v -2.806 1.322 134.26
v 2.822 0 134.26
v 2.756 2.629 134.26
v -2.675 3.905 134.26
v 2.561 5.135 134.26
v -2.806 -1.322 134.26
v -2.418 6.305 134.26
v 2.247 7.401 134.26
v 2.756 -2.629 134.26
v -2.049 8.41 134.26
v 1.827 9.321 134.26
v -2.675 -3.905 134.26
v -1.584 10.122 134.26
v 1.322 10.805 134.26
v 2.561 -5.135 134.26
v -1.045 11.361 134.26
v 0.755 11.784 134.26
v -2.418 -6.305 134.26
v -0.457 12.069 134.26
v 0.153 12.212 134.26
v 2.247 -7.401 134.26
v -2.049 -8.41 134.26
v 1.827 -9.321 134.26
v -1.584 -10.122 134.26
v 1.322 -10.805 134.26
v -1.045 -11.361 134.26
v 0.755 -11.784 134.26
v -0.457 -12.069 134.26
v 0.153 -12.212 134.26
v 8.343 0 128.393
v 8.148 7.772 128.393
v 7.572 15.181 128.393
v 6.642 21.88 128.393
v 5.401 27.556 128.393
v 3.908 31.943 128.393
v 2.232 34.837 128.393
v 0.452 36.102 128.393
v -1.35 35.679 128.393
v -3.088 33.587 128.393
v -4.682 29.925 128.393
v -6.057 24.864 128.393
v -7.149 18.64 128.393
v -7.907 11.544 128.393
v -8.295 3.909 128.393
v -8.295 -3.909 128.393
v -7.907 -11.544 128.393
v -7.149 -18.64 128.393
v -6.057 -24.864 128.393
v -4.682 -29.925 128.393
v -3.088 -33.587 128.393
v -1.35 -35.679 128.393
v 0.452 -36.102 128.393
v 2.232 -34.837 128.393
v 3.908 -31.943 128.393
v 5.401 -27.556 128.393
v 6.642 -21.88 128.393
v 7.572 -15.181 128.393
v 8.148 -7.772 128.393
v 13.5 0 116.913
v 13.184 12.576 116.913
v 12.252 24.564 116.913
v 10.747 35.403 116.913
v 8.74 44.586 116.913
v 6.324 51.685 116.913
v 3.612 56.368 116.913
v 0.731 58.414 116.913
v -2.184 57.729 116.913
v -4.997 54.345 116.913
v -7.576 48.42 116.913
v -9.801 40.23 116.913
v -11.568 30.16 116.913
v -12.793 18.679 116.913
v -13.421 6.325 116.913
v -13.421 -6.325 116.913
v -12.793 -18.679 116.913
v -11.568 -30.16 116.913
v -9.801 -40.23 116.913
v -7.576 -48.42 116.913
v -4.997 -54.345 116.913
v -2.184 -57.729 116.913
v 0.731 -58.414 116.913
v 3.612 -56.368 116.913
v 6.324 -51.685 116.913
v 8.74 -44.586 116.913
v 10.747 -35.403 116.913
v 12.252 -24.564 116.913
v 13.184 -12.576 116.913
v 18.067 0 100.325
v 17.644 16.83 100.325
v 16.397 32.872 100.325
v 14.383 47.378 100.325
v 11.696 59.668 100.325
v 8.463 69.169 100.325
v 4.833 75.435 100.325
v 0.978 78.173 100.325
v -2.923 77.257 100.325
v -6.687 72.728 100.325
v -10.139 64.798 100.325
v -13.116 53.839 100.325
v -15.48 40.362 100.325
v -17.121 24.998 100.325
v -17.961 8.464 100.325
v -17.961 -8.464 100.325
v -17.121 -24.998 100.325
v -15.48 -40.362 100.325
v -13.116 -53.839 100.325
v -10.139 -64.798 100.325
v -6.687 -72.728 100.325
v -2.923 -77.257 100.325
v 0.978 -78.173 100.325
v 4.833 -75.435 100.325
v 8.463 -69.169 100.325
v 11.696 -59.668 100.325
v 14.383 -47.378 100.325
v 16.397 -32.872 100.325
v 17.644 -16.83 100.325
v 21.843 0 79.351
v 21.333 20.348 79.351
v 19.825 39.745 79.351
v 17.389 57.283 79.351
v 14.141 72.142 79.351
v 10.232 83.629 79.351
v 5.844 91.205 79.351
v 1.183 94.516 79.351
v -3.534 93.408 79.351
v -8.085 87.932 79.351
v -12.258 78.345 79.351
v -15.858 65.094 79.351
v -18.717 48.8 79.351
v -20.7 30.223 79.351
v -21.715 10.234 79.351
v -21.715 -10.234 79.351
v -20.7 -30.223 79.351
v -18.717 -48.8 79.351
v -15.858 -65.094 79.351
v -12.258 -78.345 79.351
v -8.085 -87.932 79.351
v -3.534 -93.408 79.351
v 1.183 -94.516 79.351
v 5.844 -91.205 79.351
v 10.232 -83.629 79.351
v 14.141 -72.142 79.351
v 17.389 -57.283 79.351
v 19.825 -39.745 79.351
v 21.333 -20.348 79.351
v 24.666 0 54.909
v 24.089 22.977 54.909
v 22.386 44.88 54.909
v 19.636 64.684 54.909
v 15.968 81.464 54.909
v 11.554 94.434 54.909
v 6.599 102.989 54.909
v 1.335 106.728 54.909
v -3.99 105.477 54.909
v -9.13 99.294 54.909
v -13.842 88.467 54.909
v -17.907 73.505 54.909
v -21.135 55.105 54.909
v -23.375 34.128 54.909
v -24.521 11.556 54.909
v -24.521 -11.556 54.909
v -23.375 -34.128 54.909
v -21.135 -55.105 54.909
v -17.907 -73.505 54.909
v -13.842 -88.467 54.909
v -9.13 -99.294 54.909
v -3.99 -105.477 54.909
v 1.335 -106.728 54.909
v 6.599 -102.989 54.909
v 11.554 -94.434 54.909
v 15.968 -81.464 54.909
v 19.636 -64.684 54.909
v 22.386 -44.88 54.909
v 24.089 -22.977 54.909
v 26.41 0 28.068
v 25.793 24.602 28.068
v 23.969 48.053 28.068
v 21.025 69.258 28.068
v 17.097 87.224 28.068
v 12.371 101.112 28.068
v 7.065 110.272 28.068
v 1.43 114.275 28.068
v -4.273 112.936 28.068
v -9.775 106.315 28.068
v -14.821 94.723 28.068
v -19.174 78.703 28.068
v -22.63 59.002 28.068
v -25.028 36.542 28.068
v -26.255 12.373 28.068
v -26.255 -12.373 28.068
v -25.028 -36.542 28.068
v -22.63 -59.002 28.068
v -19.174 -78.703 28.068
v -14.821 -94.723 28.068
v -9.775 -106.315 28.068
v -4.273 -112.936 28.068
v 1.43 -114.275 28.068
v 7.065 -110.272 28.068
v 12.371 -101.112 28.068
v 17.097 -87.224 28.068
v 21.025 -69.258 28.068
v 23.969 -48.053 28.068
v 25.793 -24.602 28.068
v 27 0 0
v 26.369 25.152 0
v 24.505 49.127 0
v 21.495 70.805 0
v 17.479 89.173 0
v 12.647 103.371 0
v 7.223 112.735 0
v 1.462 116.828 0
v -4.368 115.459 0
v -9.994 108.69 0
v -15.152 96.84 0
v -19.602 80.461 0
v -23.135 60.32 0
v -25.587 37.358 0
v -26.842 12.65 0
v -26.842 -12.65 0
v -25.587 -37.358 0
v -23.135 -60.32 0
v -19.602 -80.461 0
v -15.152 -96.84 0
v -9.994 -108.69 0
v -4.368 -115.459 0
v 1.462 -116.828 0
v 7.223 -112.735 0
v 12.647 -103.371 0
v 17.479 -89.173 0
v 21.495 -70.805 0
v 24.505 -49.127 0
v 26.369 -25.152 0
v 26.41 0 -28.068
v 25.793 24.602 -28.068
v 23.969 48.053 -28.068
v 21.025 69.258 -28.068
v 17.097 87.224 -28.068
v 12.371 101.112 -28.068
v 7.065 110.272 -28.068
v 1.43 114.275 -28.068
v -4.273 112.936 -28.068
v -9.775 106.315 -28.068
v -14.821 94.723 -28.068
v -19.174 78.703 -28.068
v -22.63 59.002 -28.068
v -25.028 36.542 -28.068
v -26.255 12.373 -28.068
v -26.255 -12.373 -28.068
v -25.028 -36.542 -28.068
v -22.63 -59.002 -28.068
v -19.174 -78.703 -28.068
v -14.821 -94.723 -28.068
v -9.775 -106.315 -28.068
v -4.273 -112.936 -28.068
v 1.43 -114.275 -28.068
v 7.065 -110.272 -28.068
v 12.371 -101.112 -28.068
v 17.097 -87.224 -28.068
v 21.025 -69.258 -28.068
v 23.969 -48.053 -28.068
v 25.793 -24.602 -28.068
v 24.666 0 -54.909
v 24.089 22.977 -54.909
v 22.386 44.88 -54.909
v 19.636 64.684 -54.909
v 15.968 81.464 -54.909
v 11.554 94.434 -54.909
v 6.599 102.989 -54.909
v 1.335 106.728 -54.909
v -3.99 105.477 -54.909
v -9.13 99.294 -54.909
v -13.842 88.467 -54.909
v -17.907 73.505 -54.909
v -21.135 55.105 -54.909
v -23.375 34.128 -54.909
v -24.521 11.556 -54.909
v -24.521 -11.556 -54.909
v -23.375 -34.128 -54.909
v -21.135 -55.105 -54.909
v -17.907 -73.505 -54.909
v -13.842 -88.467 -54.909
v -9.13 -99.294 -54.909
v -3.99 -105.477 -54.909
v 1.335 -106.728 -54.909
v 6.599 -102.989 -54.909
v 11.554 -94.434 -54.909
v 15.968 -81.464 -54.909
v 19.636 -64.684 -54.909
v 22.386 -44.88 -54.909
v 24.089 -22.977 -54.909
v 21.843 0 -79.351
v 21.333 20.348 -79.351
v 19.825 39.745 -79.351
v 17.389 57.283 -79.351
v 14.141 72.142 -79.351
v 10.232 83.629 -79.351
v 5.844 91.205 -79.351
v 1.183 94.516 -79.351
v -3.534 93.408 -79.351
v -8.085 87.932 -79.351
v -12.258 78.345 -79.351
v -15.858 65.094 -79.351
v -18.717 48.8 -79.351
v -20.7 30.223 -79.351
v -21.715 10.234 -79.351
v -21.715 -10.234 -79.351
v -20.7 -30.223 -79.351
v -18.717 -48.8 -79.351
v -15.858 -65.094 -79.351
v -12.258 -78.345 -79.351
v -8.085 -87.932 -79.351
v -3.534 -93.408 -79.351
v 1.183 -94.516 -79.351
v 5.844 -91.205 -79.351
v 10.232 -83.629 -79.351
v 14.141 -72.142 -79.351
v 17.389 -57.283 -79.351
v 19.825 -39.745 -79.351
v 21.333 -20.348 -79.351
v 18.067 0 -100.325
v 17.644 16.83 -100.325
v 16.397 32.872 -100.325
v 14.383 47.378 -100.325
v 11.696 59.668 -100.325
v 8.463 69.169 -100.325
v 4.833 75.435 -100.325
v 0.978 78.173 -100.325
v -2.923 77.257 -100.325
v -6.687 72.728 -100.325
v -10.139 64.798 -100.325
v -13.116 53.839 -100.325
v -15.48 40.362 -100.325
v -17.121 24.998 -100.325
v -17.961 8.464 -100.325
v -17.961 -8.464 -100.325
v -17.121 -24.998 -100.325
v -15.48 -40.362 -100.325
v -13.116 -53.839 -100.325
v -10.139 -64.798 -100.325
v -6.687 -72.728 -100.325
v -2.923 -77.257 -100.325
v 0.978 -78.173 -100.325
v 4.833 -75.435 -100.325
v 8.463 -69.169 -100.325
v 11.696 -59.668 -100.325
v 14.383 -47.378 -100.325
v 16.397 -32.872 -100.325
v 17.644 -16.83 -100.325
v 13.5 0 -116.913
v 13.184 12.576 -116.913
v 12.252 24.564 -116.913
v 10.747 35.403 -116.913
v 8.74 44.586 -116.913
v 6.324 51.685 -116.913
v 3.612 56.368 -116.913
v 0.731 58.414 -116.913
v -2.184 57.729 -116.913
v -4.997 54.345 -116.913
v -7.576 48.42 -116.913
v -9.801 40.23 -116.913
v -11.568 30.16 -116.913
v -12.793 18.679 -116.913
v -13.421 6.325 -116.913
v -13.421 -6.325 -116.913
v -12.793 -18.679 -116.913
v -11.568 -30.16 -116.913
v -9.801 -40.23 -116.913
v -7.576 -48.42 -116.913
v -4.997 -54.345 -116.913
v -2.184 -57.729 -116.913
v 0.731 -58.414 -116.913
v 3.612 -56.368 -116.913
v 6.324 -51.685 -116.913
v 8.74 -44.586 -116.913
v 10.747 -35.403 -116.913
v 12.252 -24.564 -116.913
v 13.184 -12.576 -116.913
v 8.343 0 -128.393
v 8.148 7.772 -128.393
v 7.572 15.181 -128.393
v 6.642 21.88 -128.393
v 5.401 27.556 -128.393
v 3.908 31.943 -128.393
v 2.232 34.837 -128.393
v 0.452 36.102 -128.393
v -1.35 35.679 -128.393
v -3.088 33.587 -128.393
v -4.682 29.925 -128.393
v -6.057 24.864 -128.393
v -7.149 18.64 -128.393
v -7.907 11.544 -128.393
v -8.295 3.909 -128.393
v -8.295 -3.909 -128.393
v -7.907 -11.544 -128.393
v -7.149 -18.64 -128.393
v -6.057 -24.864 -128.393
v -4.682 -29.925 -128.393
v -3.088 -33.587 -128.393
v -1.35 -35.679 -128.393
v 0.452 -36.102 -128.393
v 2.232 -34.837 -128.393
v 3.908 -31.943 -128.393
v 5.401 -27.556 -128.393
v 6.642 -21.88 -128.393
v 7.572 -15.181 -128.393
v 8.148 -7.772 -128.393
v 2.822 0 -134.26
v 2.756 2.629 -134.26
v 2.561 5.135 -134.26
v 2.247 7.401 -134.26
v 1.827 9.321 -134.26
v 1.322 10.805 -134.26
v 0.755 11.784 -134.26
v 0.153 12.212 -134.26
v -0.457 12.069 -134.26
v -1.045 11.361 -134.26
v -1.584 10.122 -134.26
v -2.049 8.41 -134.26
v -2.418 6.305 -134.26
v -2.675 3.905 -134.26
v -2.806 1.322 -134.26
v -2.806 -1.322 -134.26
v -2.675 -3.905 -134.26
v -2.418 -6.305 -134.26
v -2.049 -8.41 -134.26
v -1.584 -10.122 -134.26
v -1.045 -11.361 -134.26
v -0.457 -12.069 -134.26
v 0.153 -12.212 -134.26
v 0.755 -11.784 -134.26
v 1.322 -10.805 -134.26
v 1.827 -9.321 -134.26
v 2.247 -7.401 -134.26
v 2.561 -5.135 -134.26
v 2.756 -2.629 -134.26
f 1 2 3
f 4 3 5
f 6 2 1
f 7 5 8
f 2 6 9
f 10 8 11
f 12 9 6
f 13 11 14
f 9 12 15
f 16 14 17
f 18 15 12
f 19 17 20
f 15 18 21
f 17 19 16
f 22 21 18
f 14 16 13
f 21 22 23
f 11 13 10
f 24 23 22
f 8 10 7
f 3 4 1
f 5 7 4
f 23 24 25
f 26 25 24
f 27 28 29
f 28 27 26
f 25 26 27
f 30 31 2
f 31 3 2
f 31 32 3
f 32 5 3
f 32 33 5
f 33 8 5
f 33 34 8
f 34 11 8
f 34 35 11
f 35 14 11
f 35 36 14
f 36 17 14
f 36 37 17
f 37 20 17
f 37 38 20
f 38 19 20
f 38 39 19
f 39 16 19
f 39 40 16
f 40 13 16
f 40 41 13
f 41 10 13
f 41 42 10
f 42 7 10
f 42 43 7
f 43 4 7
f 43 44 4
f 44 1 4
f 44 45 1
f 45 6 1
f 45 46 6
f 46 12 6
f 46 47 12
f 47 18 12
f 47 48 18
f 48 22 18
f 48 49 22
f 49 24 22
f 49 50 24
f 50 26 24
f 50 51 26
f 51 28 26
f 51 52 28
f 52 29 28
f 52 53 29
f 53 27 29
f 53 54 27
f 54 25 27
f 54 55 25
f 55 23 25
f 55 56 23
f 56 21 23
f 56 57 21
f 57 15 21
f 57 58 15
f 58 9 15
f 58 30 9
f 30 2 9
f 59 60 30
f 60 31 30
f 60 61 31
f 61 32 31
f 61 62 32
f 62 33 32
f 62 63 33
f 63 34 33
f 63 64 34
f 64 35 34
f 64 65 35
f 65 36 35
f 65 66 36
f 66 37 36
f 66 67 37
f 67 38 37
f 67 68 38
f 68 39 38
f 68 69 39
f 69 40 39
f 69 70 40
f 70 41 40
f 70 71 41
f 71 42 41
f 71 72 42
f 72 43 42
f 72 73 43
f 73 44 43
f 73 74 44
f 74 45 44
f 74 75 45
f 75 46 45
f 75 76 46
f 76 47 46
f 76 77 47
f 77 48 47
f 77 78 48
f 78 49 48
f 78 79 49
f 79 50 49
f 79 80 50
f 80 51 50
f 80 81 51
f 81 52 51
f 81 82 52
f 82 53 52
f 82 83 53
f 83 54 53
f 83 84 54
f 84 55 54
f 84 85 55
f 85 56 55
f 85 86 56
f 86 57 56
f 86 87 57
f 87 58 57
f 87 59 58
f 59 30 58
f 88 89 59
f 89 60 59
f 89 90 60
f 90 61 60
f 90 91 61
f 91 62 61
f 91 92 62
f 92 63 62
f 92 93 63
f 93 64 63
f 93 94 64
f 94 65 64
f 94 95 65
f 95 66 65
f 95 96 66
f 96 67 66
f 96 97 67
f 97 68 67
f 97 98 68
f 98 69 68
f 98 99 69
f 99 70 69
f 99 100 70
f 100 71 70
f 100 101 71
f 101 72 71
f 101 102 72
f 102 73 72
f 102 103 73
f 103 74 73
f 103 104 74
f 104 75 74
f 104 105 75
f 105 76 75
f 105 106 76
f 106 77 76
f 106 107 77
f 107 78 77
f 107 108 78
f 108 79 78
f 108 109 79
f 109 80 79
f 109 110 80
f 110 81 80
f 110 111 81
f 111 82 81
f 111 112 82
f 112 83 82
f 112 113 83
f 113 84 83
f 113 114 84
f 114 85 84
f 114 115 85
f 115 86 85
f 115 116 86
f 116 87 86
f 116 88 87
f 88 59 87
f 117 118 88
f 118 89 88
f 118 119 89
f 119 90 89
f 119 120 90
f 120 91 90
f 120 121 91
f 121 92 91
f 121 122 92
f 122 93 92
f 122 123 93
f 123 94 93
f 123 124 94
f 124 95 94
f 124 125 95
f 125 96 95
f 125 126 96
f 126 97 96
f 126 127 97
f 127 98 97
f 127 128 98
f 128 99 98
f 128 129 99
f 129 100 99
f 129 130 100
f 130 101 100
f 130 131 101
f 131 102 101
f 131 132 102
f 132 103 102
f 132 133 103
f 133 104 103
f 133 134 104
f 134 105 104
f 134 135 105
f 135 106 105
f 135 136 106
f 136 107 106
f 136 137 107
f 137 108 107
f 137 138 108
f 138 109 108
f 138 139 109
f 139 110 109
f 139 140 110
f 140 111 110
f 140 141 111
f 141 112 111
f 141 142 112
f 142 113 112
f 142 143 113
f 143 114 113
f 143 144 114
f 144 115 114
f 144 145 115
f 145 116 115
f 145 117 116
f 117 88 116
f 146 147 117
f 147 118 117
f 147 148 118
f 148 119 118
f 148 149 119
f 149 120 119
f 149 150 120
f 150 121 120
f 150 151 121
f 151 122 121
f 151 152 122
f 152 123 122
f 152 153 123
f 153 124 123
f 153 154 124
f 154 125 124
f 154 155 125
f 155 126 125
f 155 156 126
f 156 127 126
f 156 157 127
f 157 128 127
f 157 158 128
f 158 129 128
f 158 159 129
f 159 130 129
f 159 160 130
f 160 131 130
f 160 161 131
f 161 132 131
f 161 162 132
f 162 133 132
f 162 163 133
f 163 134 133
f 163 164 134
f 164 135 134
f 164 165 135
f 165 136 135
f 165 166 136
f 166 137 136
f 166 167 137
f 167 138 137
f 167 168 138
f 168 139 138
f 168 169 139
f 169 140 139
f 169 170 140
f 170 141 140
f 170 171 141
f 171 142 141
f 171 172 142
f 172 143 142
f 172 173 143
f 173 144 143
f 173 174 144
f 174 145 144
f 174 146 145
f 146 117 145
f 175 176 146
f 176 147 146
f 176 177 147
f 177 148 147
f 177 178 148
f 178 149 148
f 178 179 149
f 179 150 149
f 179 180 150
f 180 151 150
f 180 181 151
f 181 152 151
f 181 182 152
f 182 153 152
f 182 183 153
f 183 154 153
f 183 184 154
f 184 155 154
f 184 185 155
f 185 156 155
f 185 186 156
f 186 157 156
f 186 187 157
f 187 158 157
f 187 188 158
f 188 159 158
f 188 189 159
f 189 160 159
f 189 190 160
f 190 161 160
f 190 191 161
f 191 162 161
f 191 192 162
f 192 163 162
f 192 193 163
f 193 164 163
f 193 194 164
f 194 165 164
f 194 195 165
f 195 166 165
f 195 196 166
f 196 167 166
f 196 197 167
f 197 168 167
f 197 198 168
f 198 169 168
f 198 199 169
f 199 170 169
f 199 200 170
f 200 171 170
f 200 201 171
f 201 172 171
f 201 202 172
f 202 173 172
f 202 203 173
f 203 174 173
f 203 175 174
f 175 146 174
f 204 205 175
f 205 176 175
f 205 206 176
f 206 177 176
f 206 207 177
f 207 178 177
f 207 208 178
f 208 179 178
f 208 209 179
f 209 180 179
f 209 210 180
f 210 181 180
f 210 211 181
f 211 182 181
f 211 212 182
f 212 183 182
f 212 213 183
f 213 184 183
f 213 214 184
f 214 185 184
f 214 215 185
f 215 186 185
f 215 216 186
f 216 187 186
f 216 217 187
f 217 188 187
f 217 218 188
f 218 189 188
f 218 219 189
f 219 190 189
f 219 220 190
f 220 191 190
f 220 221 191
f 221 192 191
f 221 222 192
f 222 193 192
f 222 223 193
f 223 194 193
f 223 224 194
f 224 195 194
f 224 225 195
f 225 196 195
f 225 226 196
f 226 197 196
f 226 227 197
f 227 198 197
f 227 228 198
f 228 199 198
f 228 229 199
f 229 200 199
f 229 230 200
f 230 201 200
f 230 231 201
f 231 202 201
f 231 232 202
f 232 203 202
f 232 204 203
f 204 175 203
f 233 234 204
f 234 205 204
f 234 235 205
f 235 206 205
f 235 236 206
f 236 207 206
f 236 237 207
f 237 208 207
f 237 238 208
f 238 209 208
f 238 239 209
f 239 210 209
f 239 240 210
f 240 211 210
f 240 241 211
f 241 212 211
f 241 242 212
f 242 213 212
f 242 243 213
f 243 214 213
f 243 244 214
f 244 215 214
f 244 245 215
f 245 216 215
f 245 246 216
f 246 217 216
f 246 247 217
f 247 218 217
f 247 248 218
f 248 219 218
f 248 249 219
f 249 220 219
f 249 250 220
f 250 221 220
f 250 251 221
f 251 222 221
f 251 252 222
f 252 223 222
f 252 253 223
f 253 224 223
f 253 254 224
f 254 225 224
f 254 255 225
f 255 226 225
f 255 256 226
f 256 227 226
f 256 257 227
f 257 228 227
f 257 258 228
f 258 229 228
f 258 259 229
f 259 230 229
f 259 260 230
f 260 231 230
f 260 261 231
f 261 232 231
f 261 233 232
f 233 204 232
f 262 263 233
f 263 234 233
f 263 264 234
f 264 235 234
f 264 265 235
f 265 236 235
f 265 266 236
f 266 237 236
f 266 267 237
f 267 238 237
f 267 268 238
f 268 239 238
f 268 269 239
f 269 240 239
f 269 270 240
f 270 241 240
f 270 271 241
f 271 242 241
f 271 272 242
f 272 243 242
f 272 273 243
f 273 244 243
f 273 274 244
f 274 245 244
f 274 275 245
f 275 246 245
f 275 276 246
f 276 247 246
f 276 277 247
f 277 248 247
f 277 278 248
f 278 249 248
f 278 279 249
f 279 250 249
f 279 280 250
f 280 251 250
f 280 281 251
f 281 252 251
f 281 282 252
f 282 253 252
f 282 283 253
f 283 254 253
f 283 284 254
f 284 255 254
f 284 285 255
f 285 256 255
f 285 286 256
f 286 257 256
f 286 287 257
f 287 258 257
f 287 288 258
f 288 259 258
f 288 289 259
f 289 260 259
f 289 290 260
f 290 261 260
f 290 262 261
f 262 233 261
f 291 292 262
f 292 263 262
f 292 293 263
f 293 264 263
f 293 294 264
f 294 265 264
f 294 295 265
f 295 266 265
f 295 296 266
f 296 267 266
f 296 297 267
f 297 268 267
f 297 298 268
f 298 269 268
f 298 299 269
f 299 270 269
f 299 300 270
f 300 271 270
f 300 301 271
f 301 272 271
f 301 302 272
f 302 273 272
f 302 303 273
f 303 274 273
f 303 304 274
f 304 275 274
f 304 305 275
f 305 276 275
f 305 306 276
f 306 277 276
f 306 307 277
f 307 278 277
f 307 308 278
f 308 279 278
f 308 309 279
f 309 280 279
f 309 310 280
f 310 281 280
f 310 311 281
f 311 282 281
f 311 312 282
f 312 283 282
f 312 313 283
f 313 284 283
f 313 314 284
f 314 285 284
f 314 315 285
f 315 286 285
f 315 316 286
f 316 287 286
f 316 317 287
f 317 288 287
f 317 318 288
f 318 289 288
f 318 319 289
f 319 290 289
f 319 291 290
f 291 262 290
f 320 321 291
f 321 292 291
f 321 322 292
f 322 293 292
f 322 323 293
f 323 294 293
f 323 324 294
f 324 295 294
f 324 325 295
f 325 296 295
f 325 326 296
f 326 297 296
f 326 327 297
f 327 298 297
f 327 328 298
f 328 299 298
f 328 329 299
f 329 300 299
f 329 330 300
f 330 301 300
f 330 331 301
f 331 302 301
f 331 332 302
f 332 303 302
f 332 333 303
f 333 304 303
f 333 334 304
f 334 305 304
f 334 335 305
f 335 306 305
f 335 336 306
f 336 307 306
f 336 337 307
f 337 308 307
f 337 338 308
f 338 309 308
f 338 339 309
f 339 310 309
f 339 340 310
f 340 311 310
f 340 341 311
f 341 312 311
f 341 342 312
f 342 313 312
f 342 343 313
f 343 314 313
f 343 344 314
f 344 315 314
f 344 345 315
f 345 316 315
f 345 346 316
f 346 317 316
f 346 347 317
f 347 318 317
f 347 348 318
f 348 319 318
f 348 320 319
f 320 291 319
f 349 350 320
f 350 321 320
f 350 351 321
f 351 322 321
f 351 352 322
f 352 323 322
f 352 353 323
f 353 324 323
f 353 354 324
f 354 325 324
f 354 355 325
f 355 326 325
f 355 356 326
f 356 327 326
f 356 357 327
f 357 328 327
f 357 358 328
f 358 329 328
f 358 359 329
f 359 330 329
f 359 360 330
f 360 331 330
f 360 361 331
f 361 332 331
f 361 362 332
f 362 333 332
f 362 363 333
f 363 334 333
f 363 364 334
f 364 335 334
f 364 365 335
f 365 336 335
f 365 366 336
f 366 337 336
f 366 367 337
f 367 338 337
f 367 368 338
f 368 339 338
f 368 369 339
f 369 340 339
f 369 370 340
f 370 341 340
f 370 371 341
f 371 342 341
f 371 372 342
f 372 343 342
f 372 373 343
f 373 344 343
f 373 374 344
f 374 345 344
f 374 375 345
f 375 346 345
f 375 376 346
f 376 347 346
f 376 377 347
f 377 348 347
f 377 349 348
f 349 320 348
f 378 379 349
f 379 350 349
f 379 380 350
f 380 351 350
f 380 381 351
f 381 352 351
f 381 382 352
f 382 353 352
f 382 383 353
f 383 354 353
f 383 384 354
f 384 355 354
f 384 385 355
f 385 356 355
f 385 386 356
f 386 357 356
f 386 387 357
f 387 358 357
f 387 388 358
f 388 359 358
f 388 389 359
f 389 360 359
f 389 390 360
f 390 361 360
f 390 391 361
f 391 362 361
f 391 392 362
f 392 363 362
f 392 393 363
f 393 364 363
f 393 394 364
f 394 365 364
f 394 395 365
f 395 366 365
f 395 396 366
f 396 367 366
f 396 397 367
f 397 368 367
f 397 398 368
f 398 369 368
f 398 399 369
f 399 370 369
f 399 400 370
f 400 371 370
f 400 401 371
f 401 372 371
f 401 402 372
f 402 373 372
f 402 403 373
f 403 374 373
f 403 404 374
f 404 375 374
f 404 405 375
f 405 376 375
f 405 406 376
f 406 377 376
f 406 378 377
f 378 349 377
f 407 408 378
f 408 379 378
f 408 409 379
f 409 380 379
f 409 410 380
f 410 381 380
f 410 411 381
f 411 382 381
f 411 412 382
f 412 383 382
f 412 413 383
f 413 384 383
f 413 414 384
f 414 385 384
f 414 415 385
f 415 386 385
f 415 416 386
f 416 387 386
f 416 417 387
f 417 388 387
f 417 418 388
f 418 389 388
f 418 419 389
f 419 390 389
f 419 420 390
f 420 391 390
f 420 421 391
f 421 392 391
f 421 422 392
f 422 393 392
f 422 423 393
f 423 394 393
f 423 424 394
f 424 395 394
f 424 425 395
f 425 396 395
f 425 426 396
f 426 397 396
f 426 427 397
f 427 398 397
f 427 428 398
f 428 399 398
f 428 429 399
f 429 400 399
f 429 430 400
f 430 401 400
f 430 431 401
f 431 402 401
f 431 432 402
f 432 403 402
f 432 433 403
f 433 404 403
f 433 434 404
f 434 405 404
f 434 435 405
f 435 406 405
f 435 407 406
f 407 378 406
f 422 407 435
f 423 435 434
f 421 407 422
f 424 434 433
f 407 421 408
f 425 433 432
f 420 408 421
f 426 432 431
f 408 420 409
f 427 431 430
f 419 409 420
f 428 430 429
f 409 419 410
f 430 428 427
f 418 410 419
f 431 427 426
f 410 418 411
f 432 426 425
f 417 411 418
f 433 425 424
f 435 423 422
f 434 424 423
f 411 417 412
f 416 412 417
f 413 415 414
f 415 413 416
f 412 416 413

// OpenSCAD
// Generated by SolidPython 1.0.1 on 2020-07-29 00:46:45


scale(v = [3, 13, 15]) {
	sphere(r = 9);
}
/***********************************************
*********      SolidPython code:      **********
************************************************
 
# import packages: SolidPython
from solid import *
from solid.utils import *
from itertools import chain, combinations, permutations


class Resize:

    def __init__(self, scad_file):
        self.scad_file = scad_file
        #self.scad_file = import_scad(scad_file)
        # cone/cylinder param:
        self.r1 = 0
        self.r2 = 0
        self.h = 0
        # rectangular prism param:
        self.w = 0
        self.l = 0
        # ellipse param:
        self.r = 0

    # import OpenScad code (file name corresponds to shape)


    # classify shape + parameters
    def assign(self, param1, param2, param3):
        if self.scad_file == 'cone.scad':
            self.r1 = param1
            self.r2 = param2
            self.h = param3
        elif self.scad_file == 'cylinder.scad':
            self.r1 = param1
            self.r2 = param2
            self.h = param3
        elif self.scad_file == 'rectangularPrism.scad':
            self.h = param1
            self.l = param2
            self.w = param3
        else:
            self.r = param1
            self.h = param2

    # resize parameters
    def iterate(self):
        x = range(3, 20, 2)
        i = 1
        if self.scad_file == 'cone.scad':
            tempList = list(permutations(x, 2))
            for temp in tempList:
                param1 = temp[0]
                param2 = temp[1]
                filepath = 'produced_scad_files/' + 'cone' + str(param1) + '_' + str(param2) + '_' + '.scad'
                scad_render_to_file(cylinder(h=param1, r1=param2, r2=0), filepath)

        elif self.scad_file == 'cylinder.scad':
            tempList = list(permutations(x, 3))
            for temp in tempList:
                param1 = temp[0]
                param2 = temp[1]
                filepath = 'produced_scad_files/' + 'cylinder' + str(param1) + '_' + str(param2) + '_' + '.scad'
                scad_render_to_file(cylinder(h=param1, r1=param2, r2=param2), filepath)

        elif self.scad_file == 'rectangularPrism.scad':
            tempList = list(permutations(x, 3))
            for temp in tempList:
                param1 = temp[0]
                param2 = temp[1]
                param3 = temp[2]
                filepath = 'produced_scad_files/' + 'rectangularPrism' + str(param1) + '_' + str(param2) + '_' + str(
                    param3) + '.scad'
                scad_render_to_file(cube(size=(param1, param2, param3)), filepath)

        elif self.scad_file == 'ellipse.scad':
            tempList = list(permutations(x, 4))
            for temp in tempList:
                param1 = temp[0]
                param2 = temp[1]
                param3 = temp[2]
                param4 = temp[3]
                filepath = 'produced_scad_files/' + 'ellipse' + str(param1) + '_' + str(param2) + '_' + str(param3) + '_' + str(param4) + '.scad'
                scad_render_to_file(scale([param1, param2, param3])(sphere(r=param4)), filepath)

    def render_to_scadfile(self):
        scad_render_to_file(scad, 'example.scad') 
 
************************************************/
